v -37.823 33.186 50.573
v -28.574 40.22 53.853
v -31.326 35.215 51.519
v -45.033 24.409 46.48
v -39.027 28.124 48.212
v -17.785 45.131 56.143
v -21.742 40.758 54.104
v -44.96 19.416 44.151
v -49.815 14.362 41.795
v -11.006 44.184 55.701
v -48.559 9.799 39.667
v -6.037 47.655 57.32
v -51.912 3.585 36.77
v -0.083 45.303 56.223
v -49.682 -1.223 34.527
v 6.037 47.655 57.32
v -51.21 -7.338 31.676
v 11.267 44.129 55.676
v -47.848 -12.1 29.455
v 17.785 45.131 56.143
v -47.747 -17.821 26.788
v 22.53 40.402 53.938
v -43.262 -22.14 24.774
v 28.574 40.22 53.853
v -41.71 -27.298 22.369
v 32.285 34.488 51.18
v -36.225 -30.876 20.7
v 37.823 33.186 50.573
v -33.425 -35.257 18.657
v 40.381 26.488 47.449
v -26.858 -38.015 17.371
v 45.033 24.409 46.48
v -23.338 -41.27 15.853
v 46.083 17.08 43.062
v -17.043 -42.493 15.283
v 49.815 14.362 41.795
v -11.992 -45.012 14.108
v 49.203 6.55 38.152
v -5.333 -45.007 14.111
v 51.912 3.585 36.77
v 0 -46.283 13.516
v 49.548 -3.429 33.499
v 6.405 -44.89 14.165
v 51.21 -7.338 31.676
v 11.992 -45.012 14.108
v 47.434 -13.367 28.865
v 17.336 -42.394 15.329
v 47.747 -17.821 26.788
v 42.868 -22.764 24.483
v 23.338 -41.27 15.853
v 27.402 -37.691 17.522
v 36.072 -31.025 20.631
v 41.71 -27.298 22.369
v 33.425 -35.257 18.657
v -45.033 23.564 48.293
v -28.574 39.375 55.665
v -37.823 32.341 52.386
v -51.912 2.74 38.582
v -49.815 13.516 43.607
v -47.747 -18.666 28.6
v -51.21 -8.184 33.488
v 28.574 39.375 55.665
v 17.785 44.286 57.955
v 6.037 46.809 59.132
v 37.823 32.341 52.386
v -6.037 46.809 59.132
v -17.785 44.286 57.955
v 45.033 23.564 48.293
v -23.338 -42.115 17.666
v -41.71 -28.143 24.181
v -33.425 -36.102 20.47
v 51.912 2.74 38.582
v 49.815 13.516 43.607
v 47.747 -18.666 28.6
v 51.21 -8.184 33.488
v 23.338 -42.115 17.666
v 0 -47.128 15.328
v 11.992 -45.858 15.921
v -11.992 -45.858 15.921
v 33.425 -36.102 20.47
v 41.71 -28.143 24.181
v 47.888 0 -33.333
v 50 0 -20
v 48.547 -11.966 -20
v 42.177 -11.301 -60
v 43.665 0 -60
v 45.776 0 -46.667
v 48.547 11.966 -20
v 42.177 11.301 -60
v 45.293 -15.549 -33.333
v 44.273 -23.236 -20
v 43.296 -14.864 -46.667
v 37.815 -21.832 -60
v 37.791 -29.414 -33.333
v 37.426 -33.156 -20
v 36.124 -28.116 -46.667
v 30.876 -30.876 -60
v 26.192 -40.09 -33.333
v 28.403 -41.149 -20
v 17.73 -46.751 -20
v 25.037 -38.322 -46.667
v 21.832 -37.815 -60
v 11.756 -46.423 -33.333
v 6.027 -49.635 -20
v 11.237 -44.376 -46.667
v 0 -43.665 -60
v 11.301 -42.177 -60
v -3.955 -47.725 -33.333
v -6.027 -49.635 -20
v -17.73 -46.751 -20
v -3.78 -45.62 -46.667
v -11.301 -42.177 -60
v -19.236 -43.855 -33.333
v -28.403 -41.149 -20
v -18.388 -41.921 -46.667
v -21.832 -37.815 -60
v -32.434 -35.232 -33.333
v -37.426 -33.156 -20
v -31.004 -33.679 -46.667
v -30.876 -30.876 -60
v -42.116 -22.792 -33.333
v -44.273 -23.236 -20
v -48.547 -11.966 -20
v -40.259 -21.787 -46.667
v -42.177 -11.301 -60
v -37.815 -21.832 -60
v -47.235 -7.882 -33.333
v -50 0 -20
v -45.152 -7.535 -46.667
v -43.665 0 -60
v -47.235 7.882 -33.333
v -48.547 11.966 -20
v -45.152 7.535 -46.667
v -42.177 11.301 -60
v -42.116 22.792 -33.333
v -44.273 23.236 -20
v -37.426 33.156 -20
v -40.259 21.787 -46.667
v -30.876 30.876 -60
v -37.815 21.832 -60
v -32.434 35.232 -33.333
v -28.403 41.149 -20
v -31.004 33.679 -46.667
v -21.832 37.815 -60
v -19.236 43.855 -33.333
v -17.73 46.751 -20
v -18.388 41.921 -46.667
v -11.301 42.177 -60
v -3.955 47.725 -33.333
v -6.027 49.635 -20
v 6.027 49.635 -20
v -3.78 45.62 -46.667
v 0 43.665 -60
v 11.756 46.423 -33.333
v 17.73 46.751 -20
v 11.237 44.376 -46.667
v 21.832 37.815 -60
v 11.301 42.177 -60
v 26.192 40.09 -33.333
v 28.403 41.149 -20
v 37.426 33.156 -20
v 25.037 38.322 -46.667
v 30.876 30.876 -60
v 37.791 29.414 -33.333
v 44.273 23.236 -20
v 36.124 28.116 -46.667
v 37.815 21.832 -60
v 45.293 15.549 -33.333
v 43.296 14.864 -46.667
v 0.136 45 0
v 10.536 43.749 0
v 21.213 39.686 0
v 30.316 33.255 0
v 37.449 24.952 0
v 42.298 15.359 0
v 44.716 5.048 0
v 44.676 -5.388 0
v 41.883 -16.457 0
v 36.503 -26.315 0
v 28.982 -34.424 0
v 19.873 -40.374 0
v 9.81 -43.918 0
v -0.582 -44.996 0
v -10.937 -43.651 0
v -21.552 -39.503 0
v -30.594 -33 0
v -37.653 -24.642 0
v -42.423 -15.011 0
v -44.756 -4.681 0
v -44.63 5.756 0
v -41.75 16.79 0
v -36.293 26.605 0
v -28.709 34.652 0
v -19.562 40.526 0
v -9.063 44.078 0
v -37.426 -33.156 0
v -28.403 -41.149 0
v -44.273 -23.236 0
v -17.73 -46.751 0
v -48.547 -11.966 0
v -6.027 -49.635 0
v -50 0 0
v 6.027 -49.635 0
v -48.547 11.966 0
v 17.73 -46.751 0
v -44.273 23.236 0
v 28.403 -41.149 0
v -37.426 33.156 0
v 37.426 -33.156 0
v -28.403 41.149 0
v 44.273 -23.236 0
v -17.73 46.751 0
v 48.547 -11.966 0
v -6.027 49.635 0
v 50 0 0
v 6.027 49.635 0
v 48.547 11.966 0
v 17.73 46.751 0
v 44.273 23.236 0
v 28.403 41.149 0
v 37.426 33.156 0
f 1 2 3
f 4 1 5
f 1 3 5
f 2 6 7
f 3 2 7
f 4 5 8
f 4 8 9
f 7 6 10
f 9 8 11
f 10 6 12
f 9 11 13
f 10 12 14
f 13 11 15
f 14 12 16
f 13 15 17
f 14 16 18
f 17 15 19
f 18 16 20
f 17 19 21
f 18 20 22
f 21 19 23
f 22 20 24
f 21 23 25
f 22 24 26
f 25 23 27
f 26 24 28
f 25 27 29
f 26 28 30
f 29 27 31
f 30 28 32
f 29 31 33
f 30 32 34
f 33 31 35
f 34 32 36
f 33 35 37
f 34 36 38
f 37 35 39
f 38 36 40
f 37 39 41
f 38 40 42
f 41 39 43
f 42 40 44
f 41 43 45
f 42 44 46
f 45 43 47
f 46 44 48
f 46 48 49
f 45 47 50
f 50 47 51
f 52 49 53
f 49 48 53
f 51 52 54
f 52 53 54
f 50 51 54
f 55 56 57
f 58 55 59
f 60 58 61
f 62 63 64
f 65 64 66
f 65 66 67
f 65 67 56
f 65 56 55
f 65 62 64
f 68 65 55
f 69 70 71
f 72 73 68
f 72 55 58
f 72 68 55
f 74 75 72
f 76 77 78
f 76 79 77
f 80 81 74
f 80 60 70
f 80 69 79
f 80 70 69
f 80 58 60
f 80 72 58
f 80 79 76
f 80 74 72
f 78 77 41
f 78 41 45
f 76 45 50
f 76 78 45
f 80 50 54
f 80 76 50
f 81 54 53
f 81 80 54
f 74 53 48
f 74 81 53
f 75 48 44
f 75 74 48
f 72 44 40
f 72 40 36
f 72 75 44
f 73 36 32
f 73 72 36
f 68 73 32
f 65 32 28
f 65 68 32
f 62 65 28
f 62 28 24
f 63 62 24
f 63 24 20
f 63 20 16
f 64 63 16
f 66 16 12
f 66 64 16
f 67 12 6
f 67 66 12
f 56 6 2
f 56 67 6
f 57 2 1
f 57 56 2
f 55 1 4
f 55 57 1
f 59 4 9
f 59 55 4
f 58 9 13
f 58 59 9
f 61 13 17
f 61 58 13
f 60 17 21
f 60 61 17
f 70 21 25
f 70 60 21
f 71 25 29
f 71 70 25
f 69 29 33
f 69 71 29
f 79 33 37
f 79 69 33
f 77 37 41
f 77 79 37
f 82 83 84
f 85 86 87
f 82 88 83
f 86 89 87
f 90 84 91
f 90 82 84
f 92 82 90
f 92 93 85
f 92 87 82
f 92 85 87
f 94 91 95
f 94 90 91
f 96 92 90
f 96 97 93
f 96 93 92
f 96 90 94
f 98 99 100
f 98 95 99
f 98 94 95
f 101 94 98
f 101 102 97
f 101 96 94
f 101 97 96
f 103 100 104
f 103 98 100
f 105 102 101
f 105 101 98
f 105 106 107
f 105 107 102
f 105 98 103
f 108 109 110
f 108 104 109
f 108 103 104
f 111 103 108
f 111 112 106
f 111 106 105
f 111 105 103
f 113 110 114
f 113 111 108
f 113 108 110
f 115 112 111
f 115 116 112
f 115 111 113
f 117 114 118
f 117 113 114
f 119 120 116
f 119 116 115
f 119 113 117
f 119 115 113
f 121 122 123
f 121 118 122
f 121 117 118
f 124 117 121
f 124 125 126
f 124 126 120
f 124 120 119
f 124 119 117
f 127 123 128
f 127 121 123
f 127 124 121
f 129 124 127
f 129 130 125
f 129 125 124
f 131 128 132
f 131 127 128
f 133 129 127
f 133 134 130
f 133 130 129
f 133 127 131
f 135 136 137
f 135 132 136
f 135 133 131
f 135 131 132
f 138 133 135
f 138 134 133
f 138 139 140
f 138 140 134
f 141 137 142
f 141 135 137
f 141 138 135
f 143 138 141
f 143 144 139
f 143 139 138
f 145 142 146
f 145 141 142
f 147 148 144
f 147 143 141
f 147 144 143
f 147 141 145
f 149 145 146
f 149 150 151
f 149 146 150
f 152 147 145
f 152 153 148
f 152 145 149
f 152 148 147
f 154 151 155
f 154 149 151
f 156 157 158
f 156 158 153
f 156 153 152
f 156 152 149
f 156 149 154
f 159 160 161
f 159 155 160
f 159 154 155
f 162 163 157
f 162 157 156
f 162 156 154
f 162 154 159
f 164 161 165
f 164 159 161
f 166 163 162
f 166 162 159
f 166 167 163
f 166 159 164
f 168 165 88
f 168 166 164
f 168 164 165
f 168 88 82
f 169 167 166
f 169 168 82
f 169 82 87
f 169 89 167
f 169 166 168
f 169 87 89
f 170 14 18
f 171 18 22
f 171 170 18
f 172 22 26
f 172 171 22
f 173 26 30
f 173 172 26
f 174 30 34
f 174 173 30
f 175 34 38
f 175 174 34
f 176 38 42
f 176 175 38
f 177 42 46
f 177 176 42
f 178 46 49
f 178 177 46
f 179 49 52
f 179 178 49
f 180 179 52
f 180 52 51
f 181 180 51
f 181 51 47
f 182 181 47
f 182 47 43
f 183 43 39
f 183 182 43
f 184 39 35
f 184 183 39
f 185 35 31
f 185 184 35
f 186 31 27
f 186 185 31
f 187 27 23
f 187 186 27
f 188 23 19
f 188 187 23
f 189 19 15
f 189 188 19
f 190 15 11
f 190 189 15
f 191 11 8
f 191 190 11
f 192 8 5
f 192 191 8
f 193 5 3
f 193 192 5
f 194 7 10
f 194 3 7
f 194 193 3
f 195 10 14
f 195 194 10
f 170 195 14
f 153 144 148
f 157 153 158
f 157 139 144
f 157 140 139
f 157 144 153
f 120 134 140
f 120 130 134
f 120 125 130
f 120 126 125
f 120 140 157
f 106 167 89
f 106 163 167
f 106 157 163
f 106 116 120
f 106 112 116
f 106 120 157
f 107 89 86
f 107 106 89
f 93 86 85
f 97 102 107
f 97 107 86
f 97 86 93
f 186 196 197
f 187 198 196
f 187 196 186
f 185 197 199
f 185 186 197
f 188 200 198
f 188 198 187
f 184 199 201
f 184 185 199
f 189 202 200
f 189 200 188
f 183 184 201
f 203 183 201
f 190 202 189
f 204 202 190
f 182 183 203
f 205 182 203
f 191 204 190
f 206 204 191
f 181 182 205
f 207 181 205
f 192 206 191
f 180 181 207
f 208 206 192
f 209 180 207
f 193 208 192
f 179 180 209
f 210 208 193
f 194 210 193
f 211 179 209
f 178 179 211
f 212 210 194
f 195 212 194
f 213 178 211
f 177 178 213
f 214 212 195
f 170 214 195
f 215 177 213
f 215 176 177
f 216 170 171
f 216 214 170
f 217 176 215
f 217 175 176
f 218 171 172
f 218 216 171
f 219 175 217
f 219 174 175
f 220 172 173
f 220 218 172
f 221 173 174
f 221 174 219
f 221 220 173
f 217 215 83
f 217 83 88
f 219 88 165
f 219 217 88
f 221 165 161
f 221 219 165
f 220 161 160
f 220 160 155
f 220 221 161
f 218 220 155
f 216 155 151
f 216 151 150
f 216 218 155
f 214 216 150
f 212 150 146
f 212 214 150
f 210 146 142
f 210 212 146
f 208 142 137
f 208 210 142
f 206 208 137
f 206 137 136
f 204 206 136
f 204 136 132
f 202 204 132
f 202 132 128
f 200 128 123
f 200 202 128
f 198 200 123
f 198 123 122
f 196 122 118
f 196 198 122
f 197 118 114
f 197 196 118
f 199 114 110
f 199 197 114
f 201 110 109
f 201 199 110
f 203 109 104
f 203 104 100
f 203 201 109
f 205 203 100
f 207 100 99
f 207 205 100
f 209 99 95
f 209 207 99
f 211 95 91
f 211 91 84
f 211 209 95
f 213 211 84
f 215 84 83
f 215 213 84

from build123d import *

# Parameters (mm, degrees)
SKETCH1_R           = 50
BOSS_EXTRUDE1_DEPTH = 20
SKETCH4_R           = 50
BOSS_EXTRUDE2_DEPTH = 40
BOSS_EXTRUDE2_TAPER = 9
SKETCH3_7_R         = 52
BOSS_EXTRUDE4_DEPTH = 2


with BuildPart() as part:
    # Sketch1 → Boss-Extrude1 (new body)
    with BuildSketch(Plane.XY):
        Circle(SKETCH1_R)
    extrude(amount=-BOSS_EXTRUDE1_DEPTH)

    # Sketch4 → Boss-Extrude2 (add)
    with BuildSketch(Plane(origin=(0, 0, -20), x_dir=(-1, 0, 0), z_dir=(0, 0, -1))):
        with Locations(Location((0, 0, 0), (0, 0, 180))):
            Circle(SKETCH4_R)
    extrude(amount=BOSS_EXTRUDE2_DEPTH, taper=BOSS_EXTRUDE2_TAPER)

    # Loft2: read off the stored shape, not the designer's step
    # Loft2: loft between two sections, ruled curve by curve
    loft2_from = [
        Edge.make_bspline([(-0.09152616, 45.31531343, 58.435490337), (1.991803683, 45.318769716, 58.437102029), (4.206873224, 45.205331996, 58.384205151), (8.88600843, 44.645276274, 58.123046879), (11.350748929, 44.198388733, 57.914659797), (16.473473932, 42.853465541, 57.287511813), (19.132143408, 41.954695988, 56.868408687), (24.523466482, 39.583734538, 55.762811206), (27.256405564, 38.110209758, 55.075695316), (32.597052055, 34.493832776, 53.389351035), (35.204002583, 32.349251741, 52.389316475), (38.814480974, 28.61367569, 50.647388755), (39.967462866, 27.282788702, 50.02678596), (42.134576019, 24.458220553, 48.709668201), (43.14861453, 22.964518438, 48.013143466), (45.000389489, 19.831572212, 46.552226648), (45.838021163, 18.192337872, 45.787839122), (47.303056553, 14.794522163, 44.203411636), (47.930358248, 13.035986558, 43.383393016), (48.947497256, 9.433887898, 41.703706825), (49.337252793, 7.590405028, 40.844076645), (49.861578346, 3.858952965, 39.104071973), (49.99610264, 1.971088931, 38.223746516), (50.00372982, -1.805187188, 36.462840042), (49.876832475, -3.693484925, 35.582312346), (49.367583678, -7.426651708, 33.841508086), (48.985277522, -9.271415445, 32.981280629), (47.982696048, -12.876864862, 31.300031954), (47.36250218, -14.637470087, 30.479048255), (45.911202122, -18.040124056, 28.892364651), (45.080197767, -19.682126696, 28.126686245), (43.241090789, -22.82119617, 26.66291411), (42.2330929, -24.318252884, 25.9648251), (40.077404144, -27.149992649, 24.644363161), (38.929806111, -28.484696346, 24.021980606), (35.334441818, -32.232227035, 22.274478346), (32.736171819, -34.385443637, 21.270416955), (27.410169514, -38.019516805, 19.575820807), (24.683201066, -39.502099682, 18.884481058), (19.301491648, -41.89093381, 17.770549409), (16.646470579, -42.798518884, 17.347335539), (11.529212738, -44.160430414, 16.712265763), (9.066293964, -44.615493042, 16.500066575), (4.389452468, -45.191070517, 16.23167039), (2.174856003, -45.311857144, 16.175346661), (-1.991803683, -45.318769716, 16.172123276), (-4.206873224, -45.205331996, 16.225020153), (-8.88600843, -44.645276274, 16.486178425), (-11.350748929, -44.198388733, 16.694565508), (-16.473473932, -42.853465541, 17.321713492), (-19.132143408, -41.954695988, 17.740816618), (-24.523466482, -39.583734538, 18.846414099), (-27.256405564, -38.110209758, 19.533529988), (-32.597052055, -34.493832776, 21.21987427), (-35.204002583, -32.349251741, 22.21990883), (-38.814480974, -28.61367569, 23.96183655), (-39.967462866, -27.282788702, 24.582439345), (-42.134576019, -24.458220553, 25.899557104), (-43.14861453, -22.964518438, 26.596081839), (-45.000389489, -19.831572212, 28.056998657), (-45.838021163, -18.192337872, 28.821386183), (-47.303056553, -14.794522163, 30.405813669), (-47.930358248, -13.035986558, 31.225832289), (-48.947497256, -9.433887898, 32.905518479), (-49.337252793, -7.590405028, 33.76514866), (-49.861578346, -3.858952965, 35.505153332), (-49.99610264, -1.971088931, 36.385478789), (-50.00372982, 1.805187188, 38.146385262), (-49.876832475, 3.693484925, 39.026912958), (-49.367583678, 7.426651708, 40.767717218), (-48.985277522, 9.271415445, 41.627944676), (-47.982696048, 12.876864862, 43.30919335), (-47.36250218, 14.637470087, 44.13017705), (-45.911202122, 18.040124056, 45.716860654), (-45.080197767, 19.682126696, 46.48253906), (-43.241090789, 22.82119617, 47.946311195), (-42.2330929, 24.318252884, 48.644400205), (-40.077404144, 27.149992649, 49.964862143), (-38.929806111, 28.484696346, 50.587244699), (-35.334441818, 32.232227035, 52.334746958), (-32.736171819, 34.385443637, 53.338808349), (-27.410169514, 38.019516805, 55.033404498), (-24.683201066, 39.502099682, 55.724744247), (-19.301491648, 41.89093381, 56.838675895), (-16.646470579, 42.798518884, 57.261889765), (-11.529212738, 44.160430414, 57.896959542), (-9.066293964, 44.615493042, 58.10915873), (-4.389452468, 45.191070517, 58.377554915), (-2.174856003, 45.311857144, 58.433878644), (-0.09152616, 45.31531343, 58.435490337)], [0, 0, 0, 0, 0.03125, 0.03125, 0.0625, 0.0625, 0.09375, 0.09375, 0.125, 0.125, 0.15625, 0.15625, 0.171875, 0.171875, 0.1875, 0.1875, 0.203125, 0.203125, 0.21875, 0.21875, 0.234375, 0.234375, 0.25, 0.25, 0.265625, 0.265625, 0.28125, 0.28125, 0.296875, 0.296875, 0.3125, 0.3125, 0.328125, 0.328125, 0.34375, 0.34375, 0.375, 0.375, 0.40625, 0.40625, 0.4375, 0.4375, 0.46875, 0.46875, 0.5, 0.5, 0.53125, 0.53125, 0.5625, 0.5625, 0.59375, 0.59375, 0.625, 0.625, 0.65625, 0.65625, 0.671875, 0.671875, 0.6875, 0.6875, 0.703125, 0.703125, 0.71875, 0.71875, 0.734375, 0.734375, 0.75, 0.75, 0.765625, 0.765625, 0.78125, 0.78125, 0.796875, 0.796875, 0.8125, 0.8125, 0.828125, 0.828125, 0.84375, 0.84375, 0.875, 0.875, 0.90625, 0.90625, 0.9375, 0.9375, 0.96875, 0.96875, 1, 1, 1, 1], 3),
    ]
    loft2_to = [
        Edge.make_bspline([(0.136420865, 44.999793214, 0), (2.011412249, 44.994109012, 0), (4.004403567, 44.871769265, 0), (8.21287139, 44.295142718, 0), (10.428953936, 43.840585304, 0), (15.032858325, 42.482621984, 0), (17.421293091, 41.578484294, 0), (22.261978921, 39.200460503, 0), (24.714480484, 37.725249561, 0), (29.503544757, 34.110714545, 0), (31.839417938, 31.969677001, 0), (35.070773805, 28.244344926, 0), (36.102019394, 26.917691058, 0), (38.03876047, 24.10333168, 0), (38.944172383, 22.615605767, 0), (40.595623515, 19.496398085, 0), (41.341568486, 17.864926477, 0), (42.643679265, 14.484388202, 0), (43.199753477, 12.735367429, 0), (44.097775949, 9.153930324, 0), (44.439650999, 7.321593977, 0), (44.893522054, 3.613861762, 0), (45.005477417, 1.738570519, 0), (44.994109012, -2.011412249, 0), (44.870785588, -3.885990223, 0), (44.394442444, -7.590902411, 0), (44.041463999, -9.421132248, 0), (43.121743345, -12.997058703, 0), (42.555074828, -14.742675783, 0), (41.232491368, -18.115257064, 0), (40.476668297, -19.742175929, 0), (38.806335385, -22.851313328, 0), (37.891919851, -24.333522272, 0), (35.93815057, -27.136087223, 0), (34.898880272, -28.456464139, 0), (31.644996659, -32.162135635, 0), (29.296185043, -34.288971141, 0), (24.485293431, -37.87440304, 0), (22.023892564, -39.33471705, 0), (17.168877462, -41.683347464, 0), (14.775004701, -42.572987164, 0), (10.162951439, -43.903011492, 0), (7.944153589, -44.344124173, 0), (3.732266966, -44.895223668, 0), (1.738570519, -45.005477417, 0), (-2.011412249, -44.994109012, 0), (-4.004403567, -44.871769265, 0), (-8.21287139, -44.295142718, 0), (-10.428953936, -43.840585304, 0), (-15.032858325, -42.482621984, 0), (-17.421293091, -41.578484294, 0), (-22.261978921, -39.200460503, 0), (-24.714480484, -37.725249561, 0), (-29.503544757, -34.110714545, 0), (-31.839417938, -31.969677001, 0), (-35.070773805, -28.244344926, 0), (-36.102019394, -26.917691058, 0), (-38.03876047, -24.10333168, 0), (-38.944172383, -22.615605767, 0), (-40.595623515, -19.496398085, 0), (-41.341568486, -17.864926477, 0), (-42.643679265, -14.484388202, 0), (-43.199753477, -12.735367429, 0), (-44.097775949, -9.153930324, 0), (-44.439650999, -7.321593977, 0), (-44.893522054, -3.613861762, 0), (-45.005477417, -1.738570519, 0), (-44.994109012, 2.011412249, 0), (-44.870785588, 3.885990223, 0), (-44.394442444, 7.590902411, 0), (-44.041463999, 9.421132248, 0), (-43.121743345, 12.997058703, 0), (-42.555074828, 14.742675783, 0), (-41.232491368, 18.115257064, 0), (-40.476668297, 19.742175929, 0), (-38.806335385, 22.851313328, 0), (-37.891919851, 24.333522272, 0), (-35.93815057, 27.136087223, 0), (-34.898880272, 28.456464139, 0), (-31.644996659, 32.162135635, 0), (-29.296185043, 34.288971141, 0), (-24.485293431, 37.87440304, 0), (-22.023892564, 39.33471705, 0), (-17.168877462, 41.683347464, 0), (-14.775004701, 42.572987164, 0), (-10.162951439, 43.903011492, 0), (-7.944153589, 44.344124173, 0), (-3.732266966, 44.895223668, 0), (-1.738570519, 45.005477417, 0), (0.136420865, 44.999793214, 0)], [0, 0, 0, 0, 0.03125, 0.03125, 0.0625, 0.0625, 0.09375, 0.09375, 0.125, 0.125, 0.15625, 0.15625, 0.171875, 0.171875, 0.1875, 0.1875, 0.203125, 0.203125, 0.21875, 0.21875, 0.234375, 0.234375, 0.25, 0.25, 0.265625, 0.265625, 0.28125, 0.28125, 0.296875, 0.296875, 0.3125, 0.3125, 0.328125, 0.328125, 0.34375, 0.34375, 0.375, 0.375, 0.40625, 0.40625, 0.4375, 0.4375, 0.46875, 0.46875, 0.5, 0.5, 0.53125, 0.53125, 0.5625, 0.5625, 0.59375, 0.59375, 0.625, 0.625, 0.65625, 0.65625, 0.671875, 0.671875, 0.6875, 0.6875, 0.703125, 0.703125, 0.71875, 0.71875, 0.734375, 0.734375, 0.75, 0.75, 0.765625, 0.765625, 0.78125, 0.78125, 0.796875, 0.796875, 0.8125, 0.8125, 0.828125, 0.828125, 0.84375, 0.84375, 0.875, 0.875, 0.90625, 0.90625, 0.9375, 0.9375, 0.96875, 0.96875, 1, 1, 1, 1], 3),
    ]
    loft2 = Solid(Shell([*[Face.make_surface_from_curves(loft2_from[k], loft2_to[k]) for k in range(1)], Face(Wire(loft2_from)), Face(Wire(loft2_to))]))
    add(loft2)

    # Sketch3<7> → Boss-Extrude4 (add)
    with BuildSketch(Plane(origin=(0, -14.288495613, 30.641777725), x_dir=(1, 0, 0), z_dir=(0, -0.4226182617407003, 0.9063077870366496))):
        with Locations(Location((0, 15.765610554, 0), (0, 0, 270))):
            Circle(SKETCH3_7_R)
    extrude(amount=-BOSS_EXTRUDE4_DEPTH)


solid = part.part
